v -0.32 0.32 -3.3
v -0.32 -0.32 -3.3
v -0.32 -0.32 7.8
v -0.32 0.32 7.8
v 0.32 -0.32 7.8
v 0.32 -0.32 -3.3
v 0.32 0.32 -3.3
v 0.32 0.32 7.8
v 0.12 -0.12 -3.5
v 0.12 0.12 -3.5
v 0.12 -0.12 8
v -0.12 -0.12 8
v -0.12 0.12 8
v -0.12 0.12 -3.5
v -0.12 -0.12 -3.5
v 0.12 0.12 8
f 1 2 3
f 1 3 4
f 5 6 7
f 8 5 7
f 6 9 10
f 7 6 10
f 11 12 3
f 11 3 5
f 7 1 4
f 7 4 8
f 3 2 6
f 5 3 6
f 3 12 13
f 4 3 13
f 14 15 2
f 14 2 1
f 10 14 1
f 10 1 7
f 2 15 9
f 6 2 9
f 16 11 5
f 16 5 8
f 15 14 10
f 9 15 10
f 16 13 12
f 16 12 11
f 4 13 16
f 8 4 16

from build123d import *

# Parameters (mm, degrees)
EXTRUDE_1_DEPTH      = 8
EXTRUDE_1_DEPTH_BACK = 3.5
SKETCH_1_W           = 0.64
SKETCH_1_H           = 0.64
CHAMFER_1_SIZE       = 0.2


with BuildPart() as part:
    # Эскиз1 → Бобышка-Вытянуть1 (new, two sides: drawn at the far end of the back side and taken through both)
    with BuildSketch(Plane.XY.offset(-EXTRUDE_1_DEPTH_BACK)):
        Rectangle(SKETCH_1_W, SKETCH_1_H)
    extrude(amount=EXTRUDE_1_DEPTH + EXTRUDE_1_DEPTH_BACK)

    # Фаска1
    chamfer_1_edges = [part.edges().sort_by_distance(p)[0] for p in [
        (0.32, 0, 8),
        (-0.32, 0, -3.5),
        (0, 0.32, 8),
        (-0.32, 0, 8),
        (0, -0.32, 8),
        (0, -0.32, -3.5),
        (0.32, 0, -3.5),
        (0, 0.32, -3.5),
    ]]
    chamfer(chamfer_1_edges, length=CHAMFER_1_SIZE)


solid = part.part
